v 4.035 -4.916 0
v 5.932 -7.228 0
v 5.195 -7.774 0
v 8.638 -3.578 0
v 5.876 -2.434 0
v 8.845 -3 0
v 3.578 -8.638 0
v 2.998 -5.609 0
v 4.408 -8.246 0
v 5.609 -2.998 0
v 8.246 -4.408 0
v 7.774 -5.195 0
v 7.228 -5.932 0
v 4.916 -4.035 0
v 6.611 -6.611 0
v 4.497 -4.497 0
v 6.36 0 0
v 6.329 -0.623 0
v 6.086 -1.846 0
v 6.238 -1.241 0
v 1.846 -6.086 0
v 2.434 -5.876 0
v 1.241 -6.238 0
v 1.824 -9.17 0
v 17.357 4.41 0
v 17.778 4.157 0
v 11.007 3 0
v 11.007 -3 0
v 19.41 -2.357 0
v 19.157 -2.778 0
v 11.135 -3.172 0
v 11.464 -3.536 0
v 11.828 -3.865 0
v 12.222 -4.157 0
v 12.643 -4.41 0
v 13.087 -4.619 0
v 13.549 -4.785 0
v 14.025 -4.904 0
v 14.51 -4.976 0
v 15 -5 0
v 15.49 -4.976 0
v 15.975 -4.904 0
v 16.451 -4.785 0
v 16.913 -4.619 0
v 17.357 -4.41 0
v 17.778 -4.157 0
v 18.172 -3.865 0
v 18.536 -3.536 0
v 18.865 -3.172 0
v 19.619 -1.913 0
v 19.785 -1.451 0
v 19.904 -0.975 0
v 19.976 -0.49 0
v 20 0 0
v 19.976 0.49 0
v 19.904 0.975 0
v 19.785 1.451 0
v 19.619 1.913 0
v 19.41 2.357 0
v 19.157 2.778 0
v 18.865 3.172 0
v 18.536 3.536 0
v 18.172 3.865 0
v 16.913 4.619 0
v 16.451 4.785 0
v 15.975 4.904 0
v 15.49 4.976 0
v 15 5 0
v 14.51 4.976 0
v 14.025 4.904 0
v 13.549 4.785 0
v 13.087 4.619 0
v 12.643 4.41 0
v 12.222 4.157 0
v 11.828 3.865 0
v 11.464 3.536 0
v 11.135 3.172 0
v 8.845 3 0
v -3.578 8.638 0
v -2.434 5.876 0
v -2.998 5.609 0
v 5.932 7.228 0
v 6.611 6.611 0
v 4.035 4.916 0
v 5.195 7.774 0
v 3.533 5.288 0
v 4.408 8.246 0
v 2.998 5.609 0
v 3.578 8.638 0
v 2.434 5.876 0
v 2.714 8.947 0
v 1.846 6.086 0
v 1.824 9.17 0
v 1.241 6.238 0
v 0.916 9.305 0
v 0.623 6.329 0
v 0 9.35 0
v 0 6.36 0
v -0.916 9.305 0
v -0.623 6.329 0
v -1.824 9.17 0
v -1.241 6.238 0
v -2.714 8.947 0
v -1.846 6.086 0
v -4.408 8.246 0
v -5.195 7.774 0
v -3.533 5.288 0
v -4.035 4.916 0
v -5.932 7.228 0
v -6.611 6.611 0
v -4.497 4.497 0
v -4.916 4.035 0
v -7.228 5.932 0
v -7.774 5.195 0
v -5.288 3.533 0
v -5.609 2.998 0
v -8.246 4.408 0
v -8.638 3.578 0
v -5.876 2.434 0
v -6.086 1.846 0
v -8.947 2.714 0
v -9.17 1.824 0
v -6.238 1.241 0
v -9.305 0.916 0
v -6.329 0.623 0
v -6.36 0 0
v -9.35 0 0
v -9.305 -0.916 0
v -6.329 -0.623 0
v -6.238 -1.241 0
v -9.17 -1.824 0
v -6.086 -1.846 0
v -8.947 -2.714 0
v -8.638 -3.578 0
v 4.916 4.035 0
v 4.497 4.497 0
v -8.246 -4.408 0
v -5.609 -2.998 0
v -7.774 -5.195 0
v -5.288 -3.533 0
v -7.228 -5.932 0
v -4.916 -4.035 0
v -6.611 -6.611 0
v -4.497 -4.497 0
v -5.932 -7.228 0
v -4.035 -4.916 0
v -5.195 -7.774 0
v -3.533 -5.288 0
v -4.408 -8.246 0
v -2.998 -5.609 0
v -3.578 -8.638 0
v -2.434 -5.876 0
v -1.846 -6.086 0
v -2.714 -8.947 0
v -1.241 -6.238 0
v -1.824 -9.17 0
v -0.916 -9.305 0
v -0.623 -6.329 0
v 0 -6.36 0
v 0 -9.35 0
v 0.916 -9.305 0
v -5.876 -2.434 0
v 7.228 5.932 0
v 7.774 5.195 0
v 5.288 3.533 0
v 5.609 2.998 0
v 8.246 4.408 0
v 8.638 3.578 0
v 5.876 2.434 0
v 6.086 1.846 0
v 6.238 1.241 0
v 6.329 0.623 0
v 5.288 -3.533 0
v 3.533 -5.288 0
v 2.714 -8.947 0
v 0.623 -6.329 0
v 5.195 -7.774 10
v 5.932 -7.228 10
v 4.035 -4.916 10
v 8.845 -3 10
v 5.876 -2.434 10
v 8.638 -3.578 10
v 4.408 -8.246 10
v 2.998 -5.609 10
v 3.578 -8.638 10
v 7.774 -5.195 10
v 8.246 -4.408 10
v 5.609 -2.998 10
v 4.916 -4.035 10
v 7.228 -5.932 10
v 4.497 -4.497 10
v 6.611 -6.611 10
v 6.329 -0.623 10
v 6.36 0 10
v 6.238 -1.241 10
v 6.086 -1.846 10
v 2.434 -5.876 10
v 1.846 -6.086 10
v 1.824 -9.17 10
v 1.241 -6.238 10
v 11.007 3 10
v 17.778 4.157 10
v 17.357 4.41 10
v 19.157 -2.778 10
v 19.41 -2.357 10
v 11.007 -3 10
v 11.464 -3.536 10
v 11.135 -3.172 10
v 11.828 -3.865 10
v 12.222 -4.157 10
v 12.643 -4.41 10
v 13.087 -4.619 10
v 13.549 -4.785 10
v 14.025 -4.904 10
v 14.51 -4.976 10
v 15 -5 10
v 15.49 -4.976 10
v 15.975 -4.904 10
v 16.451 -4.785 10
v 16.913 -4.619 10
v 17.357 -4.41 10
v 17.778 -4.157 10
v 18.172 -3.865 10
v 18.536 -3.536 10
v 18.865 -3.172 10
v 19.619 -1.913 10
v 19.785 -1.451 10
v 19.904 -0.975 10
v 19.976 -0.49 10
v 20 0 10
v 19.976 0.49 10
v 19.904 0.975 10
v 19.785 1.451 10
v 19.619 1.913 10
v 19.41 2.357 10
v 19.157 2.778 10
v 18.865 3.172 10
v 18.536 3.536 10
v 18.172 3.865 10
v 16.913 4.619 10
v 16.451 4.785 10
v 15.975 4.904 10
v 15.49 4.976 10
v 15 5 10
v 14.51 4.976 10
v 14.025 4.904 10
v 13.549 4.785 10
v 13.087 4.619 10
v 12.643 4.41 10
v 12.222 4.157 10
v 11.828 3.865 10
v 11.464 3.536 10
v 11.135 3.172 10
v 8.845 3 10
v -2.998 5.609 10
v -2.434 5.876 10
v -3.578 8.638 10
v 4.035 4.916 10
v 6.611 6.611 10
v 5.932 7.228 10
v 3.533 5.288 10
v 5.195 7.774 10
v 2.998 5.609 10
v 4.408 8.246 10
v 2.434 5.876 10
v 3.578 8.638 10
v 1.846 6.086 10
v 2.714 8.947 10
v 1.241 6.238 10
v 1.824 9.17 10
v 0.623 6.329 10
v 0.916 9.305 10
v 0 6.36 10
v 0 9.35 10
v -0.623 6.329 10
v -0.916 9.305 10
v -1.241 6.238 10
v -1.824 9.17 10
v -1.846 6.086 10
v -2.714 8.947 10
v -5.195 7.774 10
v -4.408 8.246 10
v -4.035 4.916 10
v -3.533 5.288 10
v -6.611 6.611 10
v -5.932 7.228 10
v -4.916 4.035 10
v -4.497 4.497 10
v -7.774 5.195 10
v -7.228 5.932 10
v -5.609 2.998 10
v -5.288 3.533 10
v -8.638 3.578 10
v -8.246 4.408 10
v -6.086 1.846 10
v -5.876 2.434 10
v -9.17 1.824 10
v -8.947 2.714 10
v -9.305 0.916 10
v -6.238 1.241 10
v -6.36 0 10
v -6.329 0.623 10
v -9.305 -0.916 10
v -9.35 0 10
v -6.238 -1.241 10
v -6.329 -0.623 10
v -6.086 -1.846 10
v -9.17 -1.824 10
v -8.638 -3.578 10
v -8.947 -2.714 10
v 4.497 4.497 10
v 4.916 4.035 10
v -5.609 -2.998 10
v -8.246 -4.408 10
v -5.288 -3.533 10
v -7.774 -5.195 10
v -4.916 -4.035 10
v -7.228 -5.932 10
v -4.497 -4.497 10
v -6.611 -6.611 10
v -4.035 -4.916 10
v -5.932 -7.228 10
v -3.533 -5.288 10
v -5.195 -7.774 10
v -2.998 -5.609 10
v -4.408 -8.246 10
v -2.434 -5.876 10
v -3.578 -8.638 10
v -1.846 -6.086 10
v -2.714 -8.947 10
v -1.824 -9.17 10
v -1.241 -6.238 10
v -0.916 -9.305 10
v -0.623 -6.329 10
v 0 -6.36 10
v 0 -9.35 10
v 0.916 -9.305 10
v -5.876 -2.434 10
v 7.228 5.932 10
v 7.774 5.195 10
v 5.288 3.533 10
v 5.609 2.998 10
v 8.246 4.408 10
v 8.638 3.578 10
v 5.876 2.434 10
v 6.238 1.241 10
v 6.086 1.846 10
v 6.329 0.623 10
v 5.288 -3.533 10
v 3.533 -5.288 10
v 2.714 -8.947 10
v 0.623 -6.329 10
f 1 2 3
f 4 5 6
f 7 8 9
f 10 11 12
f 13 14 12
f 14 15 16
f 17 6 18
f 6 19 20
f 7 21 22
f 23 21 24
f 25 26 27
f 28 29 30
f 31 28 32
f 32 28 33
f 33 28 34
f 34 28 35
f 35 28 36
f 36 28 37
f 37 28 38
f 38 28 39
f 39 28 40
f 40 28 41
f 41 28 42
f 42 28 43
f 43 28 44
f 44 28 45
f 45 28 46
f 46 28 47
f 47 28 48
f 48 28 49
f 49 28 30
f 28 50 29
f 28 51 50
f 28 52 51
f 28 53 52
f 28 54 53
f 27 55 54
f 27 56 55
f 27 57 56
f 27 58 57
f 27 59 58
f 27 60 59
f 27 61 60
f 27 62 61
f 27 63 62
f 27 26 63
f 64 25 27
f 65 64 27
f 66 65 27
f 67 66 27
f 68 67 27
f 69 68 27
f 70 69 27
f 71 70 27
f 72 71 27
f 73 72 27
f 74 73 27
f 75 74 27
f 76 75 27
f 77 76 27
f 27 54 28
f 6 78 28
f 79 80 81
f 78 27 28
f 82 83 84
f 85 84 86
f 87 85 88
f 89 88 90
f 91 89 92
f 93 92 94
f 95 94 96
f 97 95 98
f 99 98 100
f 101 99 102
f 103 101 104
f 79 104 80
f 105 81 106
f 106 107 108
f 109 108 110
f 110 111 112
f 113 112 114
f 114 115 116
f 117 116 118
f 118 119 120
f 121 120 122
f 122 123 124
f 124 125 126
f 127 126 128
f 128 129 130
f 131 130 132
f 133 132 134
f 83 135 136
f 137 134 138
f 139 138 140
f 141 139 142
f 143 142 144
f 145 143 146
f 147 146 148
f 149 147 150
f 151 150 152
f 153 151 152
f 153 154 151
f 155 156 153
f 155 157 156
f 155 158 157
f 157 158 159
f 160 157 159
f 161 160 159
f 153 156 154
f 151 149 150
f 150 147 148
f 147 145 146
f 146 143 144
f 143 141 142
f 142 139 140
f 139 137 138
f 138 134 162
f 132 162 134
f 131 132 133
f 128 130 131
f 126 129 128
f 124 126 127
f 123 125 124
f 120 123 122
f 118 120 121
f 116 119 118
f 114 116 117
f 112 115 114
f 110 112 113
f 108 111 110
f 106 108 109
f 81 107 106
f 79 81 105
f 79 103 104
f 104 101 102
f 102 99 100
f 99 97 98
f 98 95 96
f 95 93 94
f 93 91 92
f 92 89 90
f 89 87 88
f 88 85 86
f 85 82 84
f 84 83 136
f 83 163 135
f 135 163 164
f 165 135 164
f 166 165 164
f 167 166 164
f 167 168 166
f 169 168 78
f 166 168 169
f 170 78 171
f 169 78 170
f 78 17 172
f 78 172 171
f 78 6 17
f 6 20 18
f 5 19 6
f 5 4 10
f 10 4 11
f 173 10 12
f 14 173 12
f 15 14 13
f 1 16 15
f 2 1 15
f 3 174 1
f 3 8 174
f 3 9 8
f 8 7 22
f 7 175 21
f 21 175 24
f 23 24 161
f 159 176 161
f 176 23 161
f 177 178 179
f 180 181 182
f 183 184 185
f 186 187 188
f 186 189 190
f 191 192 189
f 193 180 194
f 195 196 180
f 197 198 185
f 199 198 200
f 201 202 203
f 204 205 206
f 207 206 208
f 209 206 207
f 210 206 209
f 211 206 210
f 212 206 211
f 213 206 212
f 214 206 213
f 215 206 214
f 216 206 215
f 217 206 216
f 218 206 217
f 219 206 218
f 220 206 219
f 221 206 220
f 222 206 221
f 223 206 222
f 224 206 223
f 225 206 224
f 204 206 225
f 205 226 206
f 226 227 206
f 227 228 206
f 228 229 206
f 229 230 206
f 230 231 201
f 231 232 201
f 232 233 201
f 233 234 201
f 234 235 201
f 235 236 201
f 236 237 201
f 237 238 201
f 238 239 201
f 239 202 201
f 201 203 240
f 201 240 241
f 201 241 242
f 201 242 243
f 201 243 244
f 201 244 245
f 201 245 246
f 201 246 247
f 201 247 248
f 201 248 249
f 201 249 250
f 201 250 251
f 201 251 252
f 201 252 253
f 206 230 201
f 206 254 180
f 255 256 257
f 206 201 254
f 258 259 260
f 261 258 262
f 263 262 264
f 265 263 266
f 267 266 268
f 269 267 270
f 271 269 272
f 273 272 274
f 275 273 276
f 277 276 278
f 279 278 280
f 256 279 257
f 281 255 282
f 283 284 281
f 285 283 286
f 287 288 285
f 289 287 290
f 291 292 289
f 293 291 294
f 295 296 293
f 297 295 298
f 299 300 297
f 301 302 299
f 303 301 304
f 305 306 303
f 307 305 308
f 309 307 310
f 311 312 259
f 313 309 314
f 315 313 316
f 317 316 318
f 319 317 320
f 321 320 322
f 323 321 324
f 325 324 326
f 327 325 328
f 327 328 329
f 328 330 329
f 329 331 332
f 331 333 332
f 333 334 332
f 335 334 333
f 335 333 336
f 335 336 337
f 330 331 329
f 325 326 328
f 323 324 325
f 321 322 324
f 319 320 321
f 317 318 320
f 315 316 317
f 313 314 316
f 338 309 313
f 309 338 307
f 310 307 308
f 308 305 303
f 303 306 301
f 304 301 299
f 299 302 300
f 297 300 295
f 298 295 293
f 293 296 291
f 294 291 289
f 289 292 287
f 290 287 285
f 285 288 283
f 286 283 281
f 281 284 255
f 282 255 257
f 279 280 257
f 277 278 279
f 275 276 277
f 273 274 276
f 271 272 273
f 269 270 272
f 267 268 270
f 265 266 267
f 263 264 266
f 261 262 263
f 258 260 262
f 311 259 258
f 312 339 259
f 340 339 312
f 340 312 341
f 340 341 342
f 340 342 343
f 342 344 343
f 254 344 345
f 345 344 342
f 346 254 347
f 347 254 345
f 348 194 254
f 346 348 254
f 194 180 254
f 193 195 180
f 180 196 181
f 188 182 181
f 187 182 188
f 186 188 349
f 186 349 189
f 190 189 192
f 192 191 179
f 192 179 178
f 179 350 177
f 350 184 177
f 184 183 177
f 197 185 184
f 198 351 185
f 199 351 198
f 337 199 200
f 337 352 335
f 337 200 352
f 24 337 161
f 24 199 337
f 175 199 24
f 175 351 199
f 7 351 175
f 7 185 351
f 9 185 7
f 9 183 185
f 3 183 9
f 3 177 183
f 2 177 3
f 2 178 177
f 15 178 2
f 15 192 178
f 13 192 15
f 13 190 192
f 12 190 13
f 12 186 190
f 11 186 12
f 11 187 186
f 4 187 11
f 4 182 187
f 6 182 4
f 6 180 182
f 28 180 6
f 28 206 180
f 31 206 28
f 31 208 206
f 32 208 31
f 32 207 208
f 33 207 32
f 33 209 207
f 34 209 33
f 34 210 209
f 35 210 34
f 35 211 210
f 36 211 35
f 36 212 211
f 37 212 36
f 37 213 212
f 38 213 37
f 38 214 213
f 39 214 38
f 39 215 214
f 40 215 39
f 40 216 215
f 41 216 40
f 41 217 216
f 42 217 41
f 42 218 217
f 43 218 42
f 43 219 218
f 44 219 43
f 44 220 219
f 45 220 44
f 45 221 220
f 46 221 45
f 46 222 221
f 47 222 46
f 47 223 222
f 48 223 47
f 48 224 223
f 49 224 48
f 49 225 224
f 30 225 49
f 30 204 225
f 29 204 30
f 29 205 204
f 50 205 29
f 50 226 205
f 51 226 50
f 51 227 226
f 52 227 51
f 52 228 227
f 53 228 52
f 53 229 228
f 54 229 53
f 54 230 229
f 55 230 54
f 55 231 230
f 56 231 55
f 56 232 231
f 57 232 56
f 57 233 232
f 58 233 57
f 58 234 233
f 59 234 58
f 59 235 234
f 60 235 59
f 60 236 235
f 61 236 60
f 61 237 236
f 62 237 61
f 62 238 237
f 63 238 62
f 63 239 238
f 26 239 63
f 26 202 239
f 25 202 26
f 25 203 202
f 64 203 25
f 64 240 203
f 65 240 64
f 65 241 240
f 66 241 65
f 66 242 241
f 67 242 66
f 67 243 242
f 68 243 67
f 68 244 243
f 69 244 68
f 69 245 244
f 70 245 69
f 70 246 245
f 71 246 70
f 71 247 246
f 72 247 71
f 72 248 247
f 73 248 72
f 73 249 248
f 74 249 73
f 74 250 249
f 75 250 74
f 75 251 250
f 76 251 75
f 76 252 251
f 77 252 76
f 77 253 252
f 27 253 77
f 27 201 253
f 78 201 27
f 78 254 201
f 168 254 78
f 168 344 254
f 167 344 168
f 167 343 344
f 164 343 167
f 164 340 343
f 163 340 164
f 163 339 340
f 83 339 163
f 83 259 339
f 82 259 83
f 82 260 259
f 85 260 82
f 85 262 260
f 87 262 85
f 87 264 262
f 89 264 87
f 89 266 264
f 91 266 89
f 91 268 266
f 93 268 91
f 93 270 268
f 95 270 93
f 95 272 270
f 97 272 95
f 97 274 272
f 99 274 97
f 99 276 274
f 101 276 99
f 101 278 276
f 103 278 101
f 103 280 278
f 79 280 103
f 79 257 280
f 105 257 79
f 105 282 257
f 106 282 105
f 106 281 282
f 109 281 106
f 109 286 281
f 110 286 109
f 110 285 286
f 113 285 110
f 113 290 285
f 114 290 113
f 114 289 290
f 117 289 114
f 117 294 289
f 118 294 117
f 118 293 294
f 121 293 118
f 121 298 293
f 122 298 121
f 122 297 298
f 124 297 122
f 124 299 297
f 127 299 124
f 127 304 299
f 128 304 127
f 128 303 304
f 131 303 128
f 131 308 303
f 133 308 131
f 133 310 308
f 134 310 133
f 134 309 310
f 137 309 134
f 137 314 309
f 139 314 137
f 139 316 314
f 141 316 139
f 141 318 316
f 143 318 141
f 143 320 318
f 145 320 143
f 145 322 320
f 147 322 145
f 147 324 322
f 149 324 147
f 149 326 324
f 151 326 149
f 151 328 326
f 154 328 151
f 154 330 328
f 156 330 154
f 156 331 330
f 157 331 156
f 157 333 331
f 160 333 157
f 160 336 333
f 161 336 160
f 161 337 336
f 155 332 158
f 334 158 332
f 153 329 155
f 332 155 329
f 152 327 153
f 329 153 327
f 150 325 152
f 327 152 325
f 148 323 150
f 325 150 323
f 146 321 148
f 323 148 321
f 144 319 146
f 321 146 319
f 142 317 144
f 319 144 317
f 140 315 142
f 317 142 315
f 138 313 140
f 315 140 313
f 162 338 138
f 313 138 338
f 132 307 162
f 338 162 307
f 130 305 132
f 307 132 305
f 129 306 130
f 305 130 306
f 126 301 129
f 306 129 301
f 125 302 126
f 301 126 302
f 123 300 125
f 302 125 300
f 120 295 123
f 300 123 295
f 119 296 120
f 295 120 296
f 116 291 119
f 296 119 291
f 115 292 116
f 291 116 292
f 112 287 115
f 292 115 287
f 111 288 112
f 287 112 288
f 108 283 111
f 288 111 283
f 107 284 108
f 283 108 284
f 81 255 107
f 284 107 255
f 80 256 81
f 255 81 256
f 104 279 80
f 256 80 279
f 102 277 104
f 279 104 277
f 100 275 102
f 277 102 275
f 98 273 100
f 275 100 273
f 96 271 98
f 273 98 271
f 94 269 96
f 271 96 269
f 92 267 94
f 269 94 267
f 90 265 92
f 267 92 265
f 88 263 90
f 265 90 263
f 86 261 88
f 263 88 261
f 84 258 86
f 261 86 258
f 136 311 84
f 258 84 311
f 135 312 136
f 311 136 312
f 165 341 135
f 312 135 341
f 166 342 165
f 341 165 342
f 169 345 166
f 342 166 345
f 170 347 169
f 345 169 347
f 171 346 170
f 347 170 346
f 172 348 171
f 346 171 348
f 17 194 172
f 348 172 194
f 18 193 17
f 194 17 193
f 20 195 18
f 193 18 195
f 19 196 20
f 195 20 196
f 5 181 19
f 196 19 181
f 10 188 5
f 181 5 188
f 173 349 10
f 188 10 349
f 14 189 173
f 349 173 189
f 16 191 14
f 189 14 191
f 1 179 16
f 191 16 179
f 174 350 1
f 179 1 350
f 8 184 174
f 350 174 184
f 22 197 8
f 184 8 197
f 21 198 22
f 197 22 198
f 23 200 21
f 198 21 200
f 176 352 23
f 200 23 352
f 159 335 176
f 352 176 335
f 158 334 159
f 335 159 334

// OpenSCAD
// --- Dimensions ---
// Rod inner diameter
rod_id = 12.7;
// Rod wall thickness
rod_wall = 3;
// Rod outer diameter
rod_od = rod_id + 2 * rod_wall; // 18.7

// Rod ring opening: width in Y, located at -X side
rod_opening_y = 10;
rod_opening_half_y = rod_opening_y / 2; // 5

// Tubing inner diameter
tube_id = 6;
// Tubing wall thickness
tube_wall = 2;
// Tubing outer diameter
tube_od = tube_id + 2 * tube_wall; // 10

// Tubing ring opening: width in Y, located at +X side
tube_opening_y = 4.5;
tube_opening_half_y = tube_opening_y / 2; // 2.25

// Bridge width in Y
bridge_y = 6;
bridge_half_y = bridge_y / 2; // 3

// Bridge X extent
bridge_x_start = 8;
bridge_x_end = 12;

// Extrusion height (Z)
height = 10;

// --- Parameters ---
$fn = 64;

// --- Build the profile in XY plane, then extrude ---
module profile() {
    // Rod ring (centered at origin)
    difference() {
        // Outer cylinder (rod OD)
        circle(r = rod_od / 2);
        // Inner cylinder (rod ID) - slightly larger to ensure clean cut
        circle(r = rod_id / 2 + 0.01);
        // Opening on -X side: remove everything with x < 0 and |y| < 5
        translate([-0.01, 0, 0])
            square([0.01, rod_opening_y + 0.02], center = true);
    }
    
    // Tubing ring (centered at x=15, y=0)
    difference() {
        translate([15, 0]) {
            // Outer cylinder (tube OD)
            circle(r = tube_od / 2);
            // Inner cylinder (tube ID) - slightly larger to ensure clean cut
            circle(r = tube_id / 2 + 0.01);
            // Opening on +X side: remove everything with x > 15 and |y| < 2.25
            translate([0.01, 0])
                square([0.01, tube_opening_y + 0.02], center = true);
        }
    }
    
    // Bridge: solid rectangle between x=8 and x=12, width 6 in Y
    translate([(bridge_x_start + bridge_x_end) / 2, 0])
        square([bridge_x_end - bridge_x_start, bridge_y], center = true);
}

// --- Extrude the profile ---
linear_extrude(height = height)
    profile();
